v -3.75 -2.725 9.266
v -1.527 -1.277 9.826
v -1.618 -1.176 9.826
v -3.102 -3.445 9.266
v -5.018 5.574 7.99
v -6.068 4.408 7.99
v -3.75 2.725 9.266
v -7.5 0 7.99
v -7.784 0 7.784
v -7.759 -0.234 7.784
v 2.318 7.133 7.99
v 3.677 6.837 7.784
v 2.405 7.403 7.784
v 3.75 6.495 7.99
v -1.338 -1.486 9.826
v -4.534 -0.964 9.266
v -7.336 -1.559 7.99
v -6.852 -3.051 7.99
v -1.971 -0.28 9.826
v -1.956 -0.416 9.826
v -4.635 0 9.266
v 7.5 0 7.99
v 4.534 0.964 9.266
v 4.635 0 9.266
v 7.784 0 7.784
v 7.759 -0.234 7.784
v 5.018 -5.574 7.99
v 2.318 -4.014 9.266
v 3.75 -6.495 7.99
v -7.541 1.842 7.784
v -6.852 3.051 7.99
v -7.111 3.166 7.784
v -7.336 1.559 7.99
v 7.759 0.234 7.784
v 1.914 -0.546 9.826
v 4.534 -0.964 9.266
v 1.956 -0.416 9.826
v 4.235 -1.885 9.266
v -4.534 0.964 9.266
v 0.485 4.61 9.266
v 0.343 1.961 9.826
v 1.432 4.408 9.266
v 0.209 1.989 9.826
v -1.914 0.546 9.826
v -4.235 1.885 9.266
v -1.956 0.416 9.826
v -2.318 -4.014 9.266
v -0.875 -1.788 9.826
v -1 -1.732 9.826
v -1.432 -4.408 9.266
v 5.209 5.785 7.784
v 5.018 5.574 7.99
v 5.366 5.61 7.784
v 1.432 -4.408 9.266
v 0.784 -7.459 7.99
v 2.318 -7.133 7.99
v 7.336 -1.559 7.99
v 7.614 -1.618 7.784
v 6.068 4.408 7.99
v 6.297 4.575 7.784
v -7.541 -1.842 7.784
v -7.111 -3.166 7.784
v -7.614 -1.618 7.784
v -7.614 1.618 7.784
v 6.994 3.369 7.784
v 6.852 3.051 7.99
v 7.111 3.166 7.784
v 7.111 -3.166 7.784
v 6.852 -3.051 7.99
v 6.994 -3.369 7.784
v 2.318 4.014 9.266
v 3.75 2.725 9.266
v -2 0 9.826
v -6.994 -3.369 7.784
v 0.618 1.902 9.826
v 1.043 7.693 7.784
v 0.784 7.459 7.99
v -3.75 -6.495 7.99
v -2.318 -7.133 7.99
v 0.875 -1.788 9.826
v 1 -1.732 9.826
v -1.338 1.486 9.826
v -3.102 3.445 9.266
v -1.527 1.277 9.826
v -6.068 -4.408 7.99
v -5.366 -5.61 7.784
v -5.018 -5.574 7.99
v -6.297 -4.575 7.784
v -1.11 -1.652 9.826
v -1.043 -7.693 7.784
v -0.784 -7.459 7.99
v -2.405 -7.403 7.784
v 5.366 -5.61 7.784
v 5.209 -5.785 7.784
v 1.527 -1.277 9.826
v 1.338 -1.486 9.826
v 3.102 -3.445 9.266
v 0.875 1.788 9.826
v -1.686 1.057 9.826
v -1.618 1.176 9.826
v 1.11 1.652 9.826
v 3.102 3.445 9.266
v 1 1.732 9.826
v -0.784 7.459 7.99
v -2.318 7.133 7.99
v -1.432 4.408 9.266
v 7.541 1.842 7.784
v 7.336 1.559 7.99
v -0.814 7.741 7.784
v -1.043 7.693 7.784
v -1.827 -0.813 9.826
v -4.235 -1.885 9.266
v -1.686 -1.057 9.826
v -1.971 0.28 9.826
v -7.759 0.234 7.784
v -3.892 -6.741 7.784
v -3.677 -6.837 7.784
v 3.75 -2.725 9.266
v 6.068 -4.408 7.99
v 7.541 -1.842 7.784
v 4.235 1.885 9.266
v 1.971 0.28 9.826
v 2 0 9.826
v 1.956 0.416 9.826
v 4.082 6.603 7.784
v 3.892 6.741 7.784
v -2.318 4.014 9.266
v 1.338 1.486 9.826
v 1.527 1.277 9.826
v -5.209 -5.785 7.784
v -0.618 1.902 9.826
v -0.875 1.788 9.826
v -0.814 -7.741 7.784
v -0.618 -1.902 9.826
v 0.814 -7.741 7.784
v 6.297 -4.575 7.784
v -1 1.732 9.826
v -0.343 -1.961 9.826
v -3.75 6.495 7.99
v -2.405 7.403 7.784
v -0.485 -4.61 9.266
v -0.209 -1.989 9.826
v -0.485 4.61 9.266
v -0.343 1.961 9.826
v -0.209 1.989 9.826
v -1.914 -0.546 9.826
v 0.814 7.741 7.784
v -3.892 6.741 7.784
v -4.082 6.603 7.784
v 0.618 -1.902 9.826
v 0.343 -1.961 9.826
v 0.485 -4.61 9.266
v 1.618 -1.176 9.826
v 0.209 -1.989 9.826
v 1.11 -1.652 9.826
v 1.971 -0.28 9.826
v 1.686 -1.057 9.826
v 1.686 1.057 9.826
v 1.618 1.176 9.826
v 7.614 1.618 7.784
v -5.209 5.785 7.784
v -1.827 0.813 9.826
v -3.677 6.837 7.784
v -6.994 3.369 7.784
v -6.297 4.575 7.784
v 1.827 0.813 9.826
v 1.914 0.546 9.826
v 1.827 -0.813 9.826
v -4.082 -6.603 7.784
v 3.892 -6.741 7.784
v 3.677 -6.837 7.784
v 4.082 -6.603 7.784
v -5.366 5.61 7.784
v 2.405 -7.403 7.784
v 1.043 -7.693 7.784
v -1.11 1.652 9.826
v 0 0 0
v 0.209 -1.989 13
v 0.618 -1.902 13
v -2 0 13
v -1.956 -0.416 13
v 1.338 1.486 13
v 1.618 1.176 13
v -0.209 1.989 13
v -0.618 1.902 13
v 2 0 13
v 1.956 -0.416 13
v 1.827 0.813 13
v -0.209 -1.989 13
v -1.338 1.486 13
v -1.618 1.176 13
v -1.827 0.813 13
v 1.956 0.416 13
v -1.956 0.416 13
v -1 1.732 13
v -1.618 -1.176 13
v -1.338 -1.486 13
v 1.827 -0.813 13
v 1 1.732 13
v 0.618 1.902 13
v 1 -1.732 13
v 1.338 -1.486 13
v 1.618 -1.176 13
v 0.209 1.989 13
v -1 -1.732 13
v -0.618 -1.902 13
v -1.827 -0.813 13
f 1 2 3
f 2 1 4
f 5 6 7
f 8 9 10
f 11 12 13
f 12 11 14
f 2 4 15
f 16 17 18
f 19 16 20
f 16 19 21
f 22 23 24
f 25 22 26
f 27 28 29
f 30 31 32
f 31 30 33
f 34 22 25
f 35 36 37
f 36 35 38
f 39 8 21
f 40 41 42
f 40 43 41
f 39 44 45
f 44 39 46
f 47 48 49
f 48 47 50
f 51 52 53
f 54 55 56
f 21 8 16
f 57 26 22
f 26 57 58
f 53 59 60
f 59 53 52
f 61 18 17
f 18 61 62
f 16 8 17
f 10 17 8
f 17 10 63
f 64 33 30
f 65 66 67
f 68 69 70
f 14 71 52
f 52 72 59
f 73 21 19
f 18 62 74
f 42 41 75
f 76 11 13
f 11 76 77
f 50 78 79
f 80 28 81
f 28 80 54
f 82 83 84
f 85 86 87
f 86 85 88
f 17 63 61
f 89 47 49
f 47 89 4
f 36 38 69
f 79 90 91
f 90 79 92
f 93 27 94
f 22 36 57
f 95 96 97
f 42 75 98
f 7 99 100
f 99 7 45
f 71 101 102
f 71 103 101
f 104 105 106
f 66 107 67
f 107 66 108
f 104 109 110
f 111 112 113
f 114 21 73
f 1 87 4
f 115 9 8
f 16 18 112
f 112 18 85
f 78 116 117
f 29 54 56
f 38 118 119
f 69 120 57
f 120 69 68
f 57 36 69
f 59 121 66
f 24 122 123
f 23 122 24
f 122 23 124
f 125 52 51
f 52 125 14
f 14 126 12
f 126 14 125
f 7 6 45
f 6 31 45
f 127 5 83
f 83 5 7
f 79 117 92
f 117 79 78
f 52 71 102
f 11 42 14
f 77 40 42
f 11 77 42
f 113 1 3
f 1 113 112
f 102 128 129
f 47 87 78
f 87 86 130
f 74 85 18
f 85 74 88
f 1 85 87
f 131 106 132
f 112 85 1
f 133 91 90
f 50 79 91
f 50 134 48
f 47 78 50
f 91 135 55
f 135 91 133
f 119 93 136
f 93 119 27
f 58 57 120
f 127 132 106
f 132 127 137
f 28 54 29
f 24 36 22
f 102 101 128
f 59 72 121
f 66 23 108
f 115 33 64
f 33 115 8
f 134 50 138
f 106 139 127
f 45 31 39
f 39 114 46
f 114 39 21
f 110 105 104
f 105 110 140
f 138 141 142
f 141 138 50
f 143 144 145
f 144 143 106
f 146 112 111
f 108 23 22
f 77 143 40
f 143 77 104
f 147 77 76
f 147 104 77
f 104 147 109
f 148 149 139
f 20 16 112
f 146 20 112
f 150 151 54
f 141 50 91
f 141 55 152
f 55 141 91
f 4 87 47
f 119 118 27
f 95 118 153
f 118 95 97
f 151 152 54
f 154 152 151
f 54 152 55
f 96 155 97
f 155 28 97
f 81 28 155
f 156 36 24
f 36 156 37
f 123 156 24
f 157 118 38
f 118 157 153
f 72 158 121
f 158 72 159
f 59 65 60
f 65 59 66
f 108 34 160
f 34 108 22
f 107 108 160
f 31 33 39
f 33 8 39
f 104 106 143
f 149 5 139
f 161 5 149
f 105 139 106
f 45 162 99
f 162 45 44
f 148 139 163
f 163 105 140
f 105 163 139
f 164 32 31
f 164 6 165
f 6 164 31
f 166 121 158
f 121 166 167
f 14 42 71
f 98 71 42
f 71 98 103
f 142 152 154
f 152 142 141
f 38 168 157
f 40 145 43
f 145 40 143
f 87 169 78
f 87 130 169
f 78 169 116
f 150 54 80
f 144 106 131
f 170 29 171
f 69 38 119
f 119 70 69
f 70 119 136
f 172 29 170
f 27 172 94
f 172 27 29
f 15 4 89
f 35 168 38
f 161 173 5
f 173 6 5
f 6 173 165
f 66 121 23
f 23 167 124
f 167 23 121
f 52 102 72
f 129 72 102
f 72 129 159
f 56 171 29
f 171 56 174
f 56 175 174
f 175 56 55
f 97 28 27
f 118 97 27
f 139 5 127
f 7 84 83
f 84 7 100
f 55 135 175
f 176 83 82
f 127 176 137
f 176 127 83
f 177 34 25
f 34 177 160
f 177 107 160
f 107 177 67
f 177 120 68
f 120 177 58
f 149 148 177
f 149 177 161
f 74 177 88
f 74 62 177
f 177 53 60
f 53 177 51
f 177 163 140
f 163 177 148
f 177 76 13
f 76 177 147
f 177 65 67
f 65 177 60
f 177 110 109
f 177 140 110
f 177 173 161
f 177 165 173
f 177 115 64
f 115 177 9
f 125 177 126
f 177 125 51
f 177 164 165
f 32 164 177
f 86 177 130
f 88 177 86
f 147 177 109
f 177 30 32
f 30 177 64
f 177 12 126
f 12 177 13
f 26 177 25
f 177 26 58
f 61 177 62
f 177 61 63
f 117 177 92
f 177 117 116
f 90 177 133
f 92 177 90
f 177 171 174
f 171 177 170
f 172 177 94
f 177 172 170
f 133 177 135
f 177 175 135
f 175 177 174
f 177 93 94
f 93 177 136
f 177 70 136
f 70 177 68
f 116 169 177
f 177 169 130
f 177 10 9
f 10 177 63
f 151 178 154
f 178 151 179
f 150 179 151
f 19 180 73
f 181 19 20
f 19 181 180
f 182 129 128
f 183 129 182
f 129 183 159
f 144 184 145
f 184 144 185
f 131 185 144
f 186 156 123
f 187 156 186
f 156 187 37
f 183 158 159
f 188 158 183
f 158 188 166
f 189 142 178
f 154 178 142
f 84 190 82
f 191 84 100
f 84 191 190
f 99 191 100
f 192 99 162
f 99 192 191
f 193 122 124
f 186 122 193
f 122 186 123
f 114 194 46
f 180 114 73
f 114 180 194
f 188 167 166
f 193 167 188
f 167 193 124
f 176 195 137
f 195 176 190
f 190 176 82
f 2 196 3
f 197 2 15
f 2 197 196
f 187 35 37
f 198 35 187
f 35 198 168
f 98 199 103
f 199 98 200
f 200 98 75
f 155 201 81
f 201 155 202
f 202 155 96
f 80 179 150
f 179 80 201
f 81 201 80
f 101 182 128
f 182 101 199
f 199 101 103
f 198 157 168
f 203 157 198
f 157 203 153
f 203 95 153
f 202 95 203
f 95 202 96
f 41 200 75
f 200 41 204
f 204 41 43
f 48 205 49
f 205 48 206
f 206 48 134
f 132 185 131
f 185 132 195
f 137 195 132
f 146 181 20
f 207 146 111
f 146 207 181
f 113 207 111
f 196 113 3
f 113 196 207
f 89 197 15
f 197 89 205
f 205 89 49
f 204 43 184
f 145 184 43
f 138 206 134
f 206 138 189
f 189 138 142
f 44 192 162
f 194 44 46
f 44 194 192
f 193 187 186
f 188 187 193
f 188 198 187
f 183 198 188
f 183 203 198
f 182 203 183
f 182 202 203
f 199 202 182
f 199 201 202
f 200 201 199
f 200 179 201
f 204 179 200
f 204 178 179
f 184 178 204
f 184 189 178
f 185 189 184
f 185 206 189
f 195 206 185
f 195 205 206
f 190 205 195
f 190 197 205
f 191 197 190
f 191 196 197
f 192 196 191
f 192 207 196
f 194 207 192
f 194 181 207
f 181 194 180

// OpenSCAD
//3D Shapes- Design Time: Top

$fn=30;
intersection(){
  translate([0,0,-5])sphere(15);
  cylinder(10, 0, 10);
}
translate([0,0,8]) cylinder(5, 2, 2);
